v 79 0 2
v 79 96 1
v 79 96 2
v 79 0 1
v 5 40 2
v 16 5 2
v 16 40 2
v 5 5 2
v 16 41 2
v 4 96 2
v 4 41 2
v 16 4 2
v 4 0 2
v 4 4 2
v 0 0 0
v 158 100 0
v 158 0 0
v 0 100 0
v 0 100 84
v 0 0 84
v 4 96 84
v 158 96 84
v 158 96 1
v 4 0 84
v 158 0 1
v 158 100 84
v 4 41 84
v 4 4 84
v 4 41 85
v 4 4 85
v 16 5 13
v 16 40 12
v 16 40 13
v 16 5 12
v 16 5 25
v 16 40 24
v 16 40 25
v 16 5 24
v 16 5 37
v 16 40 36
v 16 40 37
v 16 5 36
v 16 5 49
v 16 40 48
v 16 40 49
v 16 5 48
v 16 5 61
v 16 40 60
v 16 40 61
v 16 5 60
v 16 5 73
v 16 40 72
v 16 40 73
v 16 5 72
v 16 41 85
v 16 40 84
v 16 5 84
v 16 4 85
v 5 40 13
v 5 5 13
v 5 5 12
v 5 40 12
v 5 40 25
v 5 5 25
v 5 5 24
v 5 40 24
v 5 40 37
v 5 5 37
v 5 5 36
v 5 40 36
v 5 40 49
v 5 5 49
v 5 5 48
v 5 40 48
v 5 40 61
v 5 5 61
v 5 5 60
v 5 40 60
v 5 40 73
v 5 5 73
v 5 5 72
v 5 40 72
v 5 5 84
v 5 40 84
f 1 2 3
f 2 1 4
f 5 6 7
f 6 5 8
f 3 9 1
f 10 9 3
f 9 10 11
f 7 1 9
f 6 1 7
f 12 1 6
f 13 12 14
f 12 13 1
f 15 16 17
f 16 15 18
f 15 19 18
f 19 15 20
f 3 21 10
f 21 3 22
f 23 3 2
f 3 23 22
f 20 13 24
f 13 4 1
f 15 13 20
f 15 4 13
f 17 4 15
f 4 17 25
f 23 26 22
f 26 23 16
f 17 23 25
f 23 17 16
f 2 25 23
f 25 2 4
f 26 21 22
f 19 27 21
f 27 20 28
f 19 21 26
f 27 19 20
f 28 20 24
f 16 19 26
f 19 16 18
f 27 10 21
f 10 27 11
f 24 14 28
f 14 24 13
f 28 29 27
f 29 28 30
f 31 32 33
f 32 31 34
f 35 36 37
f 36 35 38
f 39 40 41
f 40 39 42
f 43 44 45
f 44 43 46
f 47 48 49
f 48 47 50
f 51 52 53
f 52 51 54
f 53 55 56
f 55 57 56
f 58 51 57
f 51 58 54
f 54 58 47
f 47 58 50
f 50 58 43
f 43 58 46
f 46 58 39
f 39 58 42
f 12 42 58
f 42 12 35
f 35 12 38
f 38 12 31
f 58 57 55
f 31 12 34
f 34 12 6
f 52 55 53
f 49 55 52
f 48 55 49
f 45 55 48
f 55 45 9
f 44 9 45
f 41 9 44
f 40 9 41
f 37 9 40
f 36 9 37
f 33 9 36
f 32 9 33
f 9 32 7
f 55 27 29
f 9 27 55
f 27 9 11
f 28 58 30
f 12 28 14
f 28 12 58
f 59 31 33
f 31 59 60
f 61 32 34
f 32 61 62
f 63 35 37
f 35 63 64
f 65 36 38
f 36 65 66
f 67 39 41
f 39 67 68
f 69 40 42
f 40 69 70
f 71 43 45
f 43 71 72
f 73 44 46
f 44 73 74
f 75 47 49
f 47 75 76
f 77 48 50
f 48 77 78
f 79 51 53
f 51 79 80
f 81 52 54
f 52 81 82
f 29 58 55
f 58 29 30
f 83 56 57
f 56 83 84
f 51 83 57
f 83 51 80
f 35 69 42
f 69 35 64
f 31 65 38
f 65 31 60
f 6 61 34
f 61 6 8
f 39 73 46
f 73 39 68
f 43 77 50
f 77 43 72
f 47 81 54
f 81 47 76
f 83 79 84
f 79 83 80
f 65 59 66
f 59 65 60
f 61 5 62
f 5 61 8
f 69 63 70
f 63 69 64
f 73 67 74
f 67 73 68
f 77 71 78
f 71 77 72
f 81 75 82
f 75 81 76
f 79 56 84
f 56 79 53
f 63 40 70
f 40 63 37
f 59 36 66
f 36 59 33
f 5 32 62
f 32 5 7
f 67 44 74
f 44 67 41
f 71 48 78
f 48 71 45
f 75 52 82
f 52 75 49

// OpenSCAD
//units are in inches and scaled after

roomHeight = 84;
roomLength = 158;
roomWidth = 96;
bookcaseWidth = 36;
numShelves = 8;

module floor() {
	cube([roomLength/2,roomWidth,2]);
	translate([roomLength/2,0,0]) {
		cube([roomLength/2,roomWidth,1]);
	}
}

module eastWall() {
	
	cube([21,4,roomHeight]); //First segment
	
	translate([21,0,0]) {
		color([1,1,1,.5]) {
			cube([24,4,roomHeight]); //Door
		}
	}
	
	translate([45,0,0]) {
		cube([roomLength-45,4,roomHeight]); //Rest
	}
}

module westWall() {
	
	translate([0,roomWidth,0]) {
		cube([roomLength, 4, roomHeight]); //Wall
	}
	
	translate([24,roomWidth,24]) {
		color([1,1,1,.5]) {
			cube([36,4,48]); //Window
		}
	}
}

module southWall() {

	cube([4,roomWidth,roomHeight]);
}

module northWall() {
	
	translate([roomLength,0,0]) {
		cube([4,100,roomHeight]);
	}
}

module ceiling() {
	translate([0,0,roomHeight]) {
		cube([roomLength + 4,100,4]);
	}
}

module bookcase() {
	translate([4,4,0]) {
		cube([12,1,roomHeight]);
	}
	translate([4,4,0]) {
		cube([1,bookcaseWidth,roomHeight]);
	}
	translate([4,bookcaseWidth+4,0]) {
		cube([12,1,roomHeight]);
	}
	
	for ( x = [0:numShelves-1] ) {
		translate([4,4,x*12]) {
			cube([12,bookcaseWidth+1,1]);
		}
	}
}

floor();

color([.5,.5,.5,.5]) {
	//eastWall();
	westWall();
	southWall();
	//northWall();
	//ceiling();
};

bookcase();
